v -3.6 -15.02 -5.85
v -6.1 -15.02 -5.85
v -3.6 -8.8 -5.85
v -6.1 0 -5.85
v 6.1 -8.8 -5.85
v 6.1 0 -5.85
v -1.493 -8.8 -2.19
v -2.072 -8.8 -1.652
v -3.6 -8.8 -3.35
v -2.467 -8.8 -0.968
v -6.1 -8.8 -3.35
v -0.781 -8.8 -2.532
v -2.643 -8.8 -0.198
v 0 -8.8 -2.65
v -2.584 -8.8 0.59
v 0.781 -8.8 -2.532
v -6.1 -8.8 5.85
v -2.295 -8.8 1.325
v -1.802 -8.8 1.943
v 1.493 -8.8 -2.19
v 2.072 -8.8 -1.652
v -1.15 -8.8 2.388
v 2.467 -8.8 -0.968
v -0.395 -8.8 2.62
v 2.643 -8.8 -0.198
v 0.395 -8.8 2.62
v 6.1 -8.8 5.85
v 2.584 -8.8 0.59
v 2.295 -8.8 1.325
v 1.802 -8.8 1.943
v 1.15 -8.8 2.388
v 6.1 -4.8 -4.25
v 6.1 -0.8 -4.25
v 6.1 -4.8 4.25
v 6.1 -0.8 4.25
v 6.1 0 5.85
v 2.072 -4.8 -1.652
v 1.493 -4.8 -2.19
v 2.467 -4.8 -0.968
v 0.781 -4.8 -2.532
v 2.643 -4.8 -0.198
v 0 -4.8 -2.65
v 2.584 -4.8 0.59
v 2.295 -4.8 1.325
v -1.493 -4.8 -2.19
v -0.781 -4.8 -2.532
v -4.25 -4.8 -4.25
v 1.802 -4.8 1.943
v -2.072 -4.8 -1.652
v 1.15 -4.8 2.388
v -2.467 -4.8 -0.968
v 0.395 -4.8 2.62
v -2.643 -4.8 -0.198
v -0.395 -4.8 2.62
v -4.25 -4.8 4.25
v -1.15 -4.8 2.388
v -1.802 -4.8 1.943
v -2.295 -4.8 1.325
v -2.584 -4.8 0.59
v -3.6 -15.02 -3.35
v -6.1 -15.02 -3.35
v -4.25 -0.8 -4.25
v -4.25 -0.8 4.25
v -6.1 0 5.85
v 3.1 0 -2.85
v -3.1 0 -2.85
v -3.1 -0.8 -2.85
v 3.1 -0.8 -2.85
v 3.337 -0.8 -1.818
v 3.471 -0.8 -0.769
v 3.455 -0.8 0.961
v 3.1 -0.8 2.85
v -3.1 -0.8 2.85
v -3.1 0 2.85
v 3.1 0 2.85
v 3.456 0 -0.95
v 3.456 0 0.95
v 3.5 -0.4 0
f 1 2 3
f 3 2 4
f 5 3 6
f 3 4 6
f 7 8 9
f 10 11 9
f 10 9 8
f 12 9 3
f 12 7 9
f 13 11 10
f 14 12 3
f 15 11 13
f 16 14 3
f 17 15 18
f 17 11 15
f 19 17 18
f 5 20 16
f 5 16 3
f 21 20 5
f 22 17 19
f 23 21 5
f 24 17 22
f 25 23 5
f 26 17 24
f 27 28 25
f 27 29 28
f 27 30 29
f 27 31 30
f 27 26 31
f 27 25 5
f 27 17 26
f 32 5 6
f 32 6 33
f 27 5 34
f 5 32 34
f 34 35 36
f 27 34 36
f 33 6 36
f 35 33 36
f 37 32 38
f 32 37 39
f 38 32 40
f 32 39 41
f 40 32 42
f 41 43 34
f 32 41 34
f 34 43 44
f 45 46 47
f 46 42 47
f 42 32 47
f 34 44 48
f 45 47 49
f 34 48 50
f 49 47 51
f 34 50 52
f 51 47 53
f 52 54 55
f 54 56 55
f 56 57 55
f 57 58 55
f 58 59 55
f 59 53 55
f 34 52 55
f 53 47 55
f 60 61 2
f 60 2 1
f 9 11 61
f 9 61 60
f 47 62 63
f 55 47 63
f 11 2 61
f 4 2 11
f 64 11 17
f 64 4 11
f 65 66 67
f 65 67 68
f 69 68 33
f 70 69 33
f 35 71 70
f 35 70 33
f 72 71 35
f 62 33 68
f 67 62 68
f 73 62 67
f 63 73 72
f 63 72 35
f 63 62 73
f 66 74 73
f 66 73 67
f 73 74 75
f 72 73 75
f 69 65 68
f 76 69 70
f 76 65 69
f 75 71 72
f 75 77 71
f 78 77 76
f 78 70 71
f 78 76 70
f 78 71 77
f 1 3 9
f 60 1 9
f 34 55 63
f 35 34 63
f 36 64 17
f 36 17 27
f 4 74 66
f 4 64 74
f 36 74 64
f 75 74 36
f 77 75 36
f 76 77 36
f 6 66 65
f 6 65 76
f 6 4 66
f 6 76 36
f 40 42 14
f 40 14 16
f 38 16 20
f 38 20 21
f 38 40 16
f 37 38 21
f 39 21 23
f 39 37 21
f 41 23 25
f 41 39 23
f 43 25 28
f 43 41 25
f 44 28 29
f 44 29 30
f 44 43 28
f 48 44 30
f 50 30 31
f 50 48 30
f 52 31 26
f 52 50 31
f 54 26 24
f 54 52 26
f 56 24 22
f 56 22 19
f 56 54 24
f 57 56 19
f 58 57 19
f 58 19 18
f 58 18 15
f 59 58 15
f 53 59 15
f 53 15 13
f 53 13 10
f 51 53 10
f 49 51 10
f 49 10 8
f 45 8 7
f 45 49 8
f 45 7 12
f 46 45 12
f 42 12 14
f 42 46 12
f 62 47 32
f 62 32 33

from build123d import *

# Parameters (mm, degrees)
SKETCH2_W           = 12.2
SKETCH2_H           = 11.7
SKETCH2_W_2         = 6.2
SKETCH2_H_2         = 5.7
BOSS_EXTRUDE1_DEPTH = 0.8
SKETCH3_W           = 12.2
SKETCH3_H           = 11.7
SKETCH3_W_2         = 8.5
SKETCH3_H_2         = 8.5
BOSS_EXTRUDE2_DEPTH = 4
SKETCH4_W           = 12.2
SKETCH4_H           = 11.7
SKETCH4_R           = 2.65
BOSS_EXTRUDE3_DEPTH = 4
SKETCH5_W           = 2.5
SKETCH5_H           = 2.5
BOSS_EXTRUDE4_DEPTH = 6.22
SKETCH8_W           = 8.5
SKETCH8_H           = 4
CUT_EXTRUDE2_DEPTH  = 6.22
CUT_EXTRUDE3_DEPTH  = 2


with BuildPart() as part:
    # Sketch2 → Boss-Extrude1 (new body)
    with BuildSketch(Plane(origin=(0, 0, 0), x_dir=(1, 0, 0), z_dir=(0, 1, 0))):
        Rectangle(SKETCH2_W, SKETCH2_H)
        Rectangle(SKETCH2_W_2, SKETCH2_H_2, mode=Mode.SUBTRACT)
    extrude(amount=-BOSS_EXTRUDE1_DEPTH)

    # Sketch3 → Boss-Extrude2 (add)
    with BuildSketch(Plane.XZ.offset(0.8)):
        Rectangle(SKETCH3_W, SKETCH3_H)
        Rectangle(SKETCH3_W_2, SKETCH3_H_2, mode=Mode.SUBTRACT)
    extrude(amount=BOSS_EXTRUDE2_DEPTH)

    # Sketch4 → Boss-Extrude3 (add)
    with BuildSketch(Plane.XZ.offset(4.8)):
        Rectangle(SKETCH4_W, SKETCH4_H)
        with Locations(Location((0, 0, 0), (0, 0, 270))):
            Circle(SKETCH4_R, mode=Mode.SUBTRACT)
    extrude(amount=BOSS_EXTRUDE3_DEPTH)

    # Sketch5 → Boss-Extrude4 (add)
    with BuildSketch(Plane.XZ.offset(8.8)):
        with Locations((-4.85, -4.6)):
            Rectangle(SKETCH5_W, SKETCH5_H)
    extrude(amount=BOSS_EXTRUDE4_DEPTH)

    # Sketch8 → Cut-Extrude2 (cut)
    with BuildSketch(Plane.ZY.offset(-4.25)):
        with Locations((0, -2.8)):
            Rectangle(SKETCH8_W, SKETCH8_H)
    extrude(amount=-CUT_EXTRUDE2_DEPTH, mode=Mode.SUBTRACT)

    # Sketch9 → Cut-Extrude3 (cut)
    with BuildSketch(Plane(origin=(0, 0, 0), x_dir=(1, 0, 0), z_dir=(0, 1, 0))):
        with BuildLine():
            Line((3.1, 2.85), (3.1, -2.85))
            add(Edge.make_bspline(
                [(3.1, 2.85), (3.9, 0), (3.1, -2.85)],
                knots=[0, 0, 0, 1, 1, 1], degree=2))
        make_face()
    extrude(amount=-CUT_EXTRUDE3_DEPTH, mode=Mode.SUBTRACT)


solid = part.part
